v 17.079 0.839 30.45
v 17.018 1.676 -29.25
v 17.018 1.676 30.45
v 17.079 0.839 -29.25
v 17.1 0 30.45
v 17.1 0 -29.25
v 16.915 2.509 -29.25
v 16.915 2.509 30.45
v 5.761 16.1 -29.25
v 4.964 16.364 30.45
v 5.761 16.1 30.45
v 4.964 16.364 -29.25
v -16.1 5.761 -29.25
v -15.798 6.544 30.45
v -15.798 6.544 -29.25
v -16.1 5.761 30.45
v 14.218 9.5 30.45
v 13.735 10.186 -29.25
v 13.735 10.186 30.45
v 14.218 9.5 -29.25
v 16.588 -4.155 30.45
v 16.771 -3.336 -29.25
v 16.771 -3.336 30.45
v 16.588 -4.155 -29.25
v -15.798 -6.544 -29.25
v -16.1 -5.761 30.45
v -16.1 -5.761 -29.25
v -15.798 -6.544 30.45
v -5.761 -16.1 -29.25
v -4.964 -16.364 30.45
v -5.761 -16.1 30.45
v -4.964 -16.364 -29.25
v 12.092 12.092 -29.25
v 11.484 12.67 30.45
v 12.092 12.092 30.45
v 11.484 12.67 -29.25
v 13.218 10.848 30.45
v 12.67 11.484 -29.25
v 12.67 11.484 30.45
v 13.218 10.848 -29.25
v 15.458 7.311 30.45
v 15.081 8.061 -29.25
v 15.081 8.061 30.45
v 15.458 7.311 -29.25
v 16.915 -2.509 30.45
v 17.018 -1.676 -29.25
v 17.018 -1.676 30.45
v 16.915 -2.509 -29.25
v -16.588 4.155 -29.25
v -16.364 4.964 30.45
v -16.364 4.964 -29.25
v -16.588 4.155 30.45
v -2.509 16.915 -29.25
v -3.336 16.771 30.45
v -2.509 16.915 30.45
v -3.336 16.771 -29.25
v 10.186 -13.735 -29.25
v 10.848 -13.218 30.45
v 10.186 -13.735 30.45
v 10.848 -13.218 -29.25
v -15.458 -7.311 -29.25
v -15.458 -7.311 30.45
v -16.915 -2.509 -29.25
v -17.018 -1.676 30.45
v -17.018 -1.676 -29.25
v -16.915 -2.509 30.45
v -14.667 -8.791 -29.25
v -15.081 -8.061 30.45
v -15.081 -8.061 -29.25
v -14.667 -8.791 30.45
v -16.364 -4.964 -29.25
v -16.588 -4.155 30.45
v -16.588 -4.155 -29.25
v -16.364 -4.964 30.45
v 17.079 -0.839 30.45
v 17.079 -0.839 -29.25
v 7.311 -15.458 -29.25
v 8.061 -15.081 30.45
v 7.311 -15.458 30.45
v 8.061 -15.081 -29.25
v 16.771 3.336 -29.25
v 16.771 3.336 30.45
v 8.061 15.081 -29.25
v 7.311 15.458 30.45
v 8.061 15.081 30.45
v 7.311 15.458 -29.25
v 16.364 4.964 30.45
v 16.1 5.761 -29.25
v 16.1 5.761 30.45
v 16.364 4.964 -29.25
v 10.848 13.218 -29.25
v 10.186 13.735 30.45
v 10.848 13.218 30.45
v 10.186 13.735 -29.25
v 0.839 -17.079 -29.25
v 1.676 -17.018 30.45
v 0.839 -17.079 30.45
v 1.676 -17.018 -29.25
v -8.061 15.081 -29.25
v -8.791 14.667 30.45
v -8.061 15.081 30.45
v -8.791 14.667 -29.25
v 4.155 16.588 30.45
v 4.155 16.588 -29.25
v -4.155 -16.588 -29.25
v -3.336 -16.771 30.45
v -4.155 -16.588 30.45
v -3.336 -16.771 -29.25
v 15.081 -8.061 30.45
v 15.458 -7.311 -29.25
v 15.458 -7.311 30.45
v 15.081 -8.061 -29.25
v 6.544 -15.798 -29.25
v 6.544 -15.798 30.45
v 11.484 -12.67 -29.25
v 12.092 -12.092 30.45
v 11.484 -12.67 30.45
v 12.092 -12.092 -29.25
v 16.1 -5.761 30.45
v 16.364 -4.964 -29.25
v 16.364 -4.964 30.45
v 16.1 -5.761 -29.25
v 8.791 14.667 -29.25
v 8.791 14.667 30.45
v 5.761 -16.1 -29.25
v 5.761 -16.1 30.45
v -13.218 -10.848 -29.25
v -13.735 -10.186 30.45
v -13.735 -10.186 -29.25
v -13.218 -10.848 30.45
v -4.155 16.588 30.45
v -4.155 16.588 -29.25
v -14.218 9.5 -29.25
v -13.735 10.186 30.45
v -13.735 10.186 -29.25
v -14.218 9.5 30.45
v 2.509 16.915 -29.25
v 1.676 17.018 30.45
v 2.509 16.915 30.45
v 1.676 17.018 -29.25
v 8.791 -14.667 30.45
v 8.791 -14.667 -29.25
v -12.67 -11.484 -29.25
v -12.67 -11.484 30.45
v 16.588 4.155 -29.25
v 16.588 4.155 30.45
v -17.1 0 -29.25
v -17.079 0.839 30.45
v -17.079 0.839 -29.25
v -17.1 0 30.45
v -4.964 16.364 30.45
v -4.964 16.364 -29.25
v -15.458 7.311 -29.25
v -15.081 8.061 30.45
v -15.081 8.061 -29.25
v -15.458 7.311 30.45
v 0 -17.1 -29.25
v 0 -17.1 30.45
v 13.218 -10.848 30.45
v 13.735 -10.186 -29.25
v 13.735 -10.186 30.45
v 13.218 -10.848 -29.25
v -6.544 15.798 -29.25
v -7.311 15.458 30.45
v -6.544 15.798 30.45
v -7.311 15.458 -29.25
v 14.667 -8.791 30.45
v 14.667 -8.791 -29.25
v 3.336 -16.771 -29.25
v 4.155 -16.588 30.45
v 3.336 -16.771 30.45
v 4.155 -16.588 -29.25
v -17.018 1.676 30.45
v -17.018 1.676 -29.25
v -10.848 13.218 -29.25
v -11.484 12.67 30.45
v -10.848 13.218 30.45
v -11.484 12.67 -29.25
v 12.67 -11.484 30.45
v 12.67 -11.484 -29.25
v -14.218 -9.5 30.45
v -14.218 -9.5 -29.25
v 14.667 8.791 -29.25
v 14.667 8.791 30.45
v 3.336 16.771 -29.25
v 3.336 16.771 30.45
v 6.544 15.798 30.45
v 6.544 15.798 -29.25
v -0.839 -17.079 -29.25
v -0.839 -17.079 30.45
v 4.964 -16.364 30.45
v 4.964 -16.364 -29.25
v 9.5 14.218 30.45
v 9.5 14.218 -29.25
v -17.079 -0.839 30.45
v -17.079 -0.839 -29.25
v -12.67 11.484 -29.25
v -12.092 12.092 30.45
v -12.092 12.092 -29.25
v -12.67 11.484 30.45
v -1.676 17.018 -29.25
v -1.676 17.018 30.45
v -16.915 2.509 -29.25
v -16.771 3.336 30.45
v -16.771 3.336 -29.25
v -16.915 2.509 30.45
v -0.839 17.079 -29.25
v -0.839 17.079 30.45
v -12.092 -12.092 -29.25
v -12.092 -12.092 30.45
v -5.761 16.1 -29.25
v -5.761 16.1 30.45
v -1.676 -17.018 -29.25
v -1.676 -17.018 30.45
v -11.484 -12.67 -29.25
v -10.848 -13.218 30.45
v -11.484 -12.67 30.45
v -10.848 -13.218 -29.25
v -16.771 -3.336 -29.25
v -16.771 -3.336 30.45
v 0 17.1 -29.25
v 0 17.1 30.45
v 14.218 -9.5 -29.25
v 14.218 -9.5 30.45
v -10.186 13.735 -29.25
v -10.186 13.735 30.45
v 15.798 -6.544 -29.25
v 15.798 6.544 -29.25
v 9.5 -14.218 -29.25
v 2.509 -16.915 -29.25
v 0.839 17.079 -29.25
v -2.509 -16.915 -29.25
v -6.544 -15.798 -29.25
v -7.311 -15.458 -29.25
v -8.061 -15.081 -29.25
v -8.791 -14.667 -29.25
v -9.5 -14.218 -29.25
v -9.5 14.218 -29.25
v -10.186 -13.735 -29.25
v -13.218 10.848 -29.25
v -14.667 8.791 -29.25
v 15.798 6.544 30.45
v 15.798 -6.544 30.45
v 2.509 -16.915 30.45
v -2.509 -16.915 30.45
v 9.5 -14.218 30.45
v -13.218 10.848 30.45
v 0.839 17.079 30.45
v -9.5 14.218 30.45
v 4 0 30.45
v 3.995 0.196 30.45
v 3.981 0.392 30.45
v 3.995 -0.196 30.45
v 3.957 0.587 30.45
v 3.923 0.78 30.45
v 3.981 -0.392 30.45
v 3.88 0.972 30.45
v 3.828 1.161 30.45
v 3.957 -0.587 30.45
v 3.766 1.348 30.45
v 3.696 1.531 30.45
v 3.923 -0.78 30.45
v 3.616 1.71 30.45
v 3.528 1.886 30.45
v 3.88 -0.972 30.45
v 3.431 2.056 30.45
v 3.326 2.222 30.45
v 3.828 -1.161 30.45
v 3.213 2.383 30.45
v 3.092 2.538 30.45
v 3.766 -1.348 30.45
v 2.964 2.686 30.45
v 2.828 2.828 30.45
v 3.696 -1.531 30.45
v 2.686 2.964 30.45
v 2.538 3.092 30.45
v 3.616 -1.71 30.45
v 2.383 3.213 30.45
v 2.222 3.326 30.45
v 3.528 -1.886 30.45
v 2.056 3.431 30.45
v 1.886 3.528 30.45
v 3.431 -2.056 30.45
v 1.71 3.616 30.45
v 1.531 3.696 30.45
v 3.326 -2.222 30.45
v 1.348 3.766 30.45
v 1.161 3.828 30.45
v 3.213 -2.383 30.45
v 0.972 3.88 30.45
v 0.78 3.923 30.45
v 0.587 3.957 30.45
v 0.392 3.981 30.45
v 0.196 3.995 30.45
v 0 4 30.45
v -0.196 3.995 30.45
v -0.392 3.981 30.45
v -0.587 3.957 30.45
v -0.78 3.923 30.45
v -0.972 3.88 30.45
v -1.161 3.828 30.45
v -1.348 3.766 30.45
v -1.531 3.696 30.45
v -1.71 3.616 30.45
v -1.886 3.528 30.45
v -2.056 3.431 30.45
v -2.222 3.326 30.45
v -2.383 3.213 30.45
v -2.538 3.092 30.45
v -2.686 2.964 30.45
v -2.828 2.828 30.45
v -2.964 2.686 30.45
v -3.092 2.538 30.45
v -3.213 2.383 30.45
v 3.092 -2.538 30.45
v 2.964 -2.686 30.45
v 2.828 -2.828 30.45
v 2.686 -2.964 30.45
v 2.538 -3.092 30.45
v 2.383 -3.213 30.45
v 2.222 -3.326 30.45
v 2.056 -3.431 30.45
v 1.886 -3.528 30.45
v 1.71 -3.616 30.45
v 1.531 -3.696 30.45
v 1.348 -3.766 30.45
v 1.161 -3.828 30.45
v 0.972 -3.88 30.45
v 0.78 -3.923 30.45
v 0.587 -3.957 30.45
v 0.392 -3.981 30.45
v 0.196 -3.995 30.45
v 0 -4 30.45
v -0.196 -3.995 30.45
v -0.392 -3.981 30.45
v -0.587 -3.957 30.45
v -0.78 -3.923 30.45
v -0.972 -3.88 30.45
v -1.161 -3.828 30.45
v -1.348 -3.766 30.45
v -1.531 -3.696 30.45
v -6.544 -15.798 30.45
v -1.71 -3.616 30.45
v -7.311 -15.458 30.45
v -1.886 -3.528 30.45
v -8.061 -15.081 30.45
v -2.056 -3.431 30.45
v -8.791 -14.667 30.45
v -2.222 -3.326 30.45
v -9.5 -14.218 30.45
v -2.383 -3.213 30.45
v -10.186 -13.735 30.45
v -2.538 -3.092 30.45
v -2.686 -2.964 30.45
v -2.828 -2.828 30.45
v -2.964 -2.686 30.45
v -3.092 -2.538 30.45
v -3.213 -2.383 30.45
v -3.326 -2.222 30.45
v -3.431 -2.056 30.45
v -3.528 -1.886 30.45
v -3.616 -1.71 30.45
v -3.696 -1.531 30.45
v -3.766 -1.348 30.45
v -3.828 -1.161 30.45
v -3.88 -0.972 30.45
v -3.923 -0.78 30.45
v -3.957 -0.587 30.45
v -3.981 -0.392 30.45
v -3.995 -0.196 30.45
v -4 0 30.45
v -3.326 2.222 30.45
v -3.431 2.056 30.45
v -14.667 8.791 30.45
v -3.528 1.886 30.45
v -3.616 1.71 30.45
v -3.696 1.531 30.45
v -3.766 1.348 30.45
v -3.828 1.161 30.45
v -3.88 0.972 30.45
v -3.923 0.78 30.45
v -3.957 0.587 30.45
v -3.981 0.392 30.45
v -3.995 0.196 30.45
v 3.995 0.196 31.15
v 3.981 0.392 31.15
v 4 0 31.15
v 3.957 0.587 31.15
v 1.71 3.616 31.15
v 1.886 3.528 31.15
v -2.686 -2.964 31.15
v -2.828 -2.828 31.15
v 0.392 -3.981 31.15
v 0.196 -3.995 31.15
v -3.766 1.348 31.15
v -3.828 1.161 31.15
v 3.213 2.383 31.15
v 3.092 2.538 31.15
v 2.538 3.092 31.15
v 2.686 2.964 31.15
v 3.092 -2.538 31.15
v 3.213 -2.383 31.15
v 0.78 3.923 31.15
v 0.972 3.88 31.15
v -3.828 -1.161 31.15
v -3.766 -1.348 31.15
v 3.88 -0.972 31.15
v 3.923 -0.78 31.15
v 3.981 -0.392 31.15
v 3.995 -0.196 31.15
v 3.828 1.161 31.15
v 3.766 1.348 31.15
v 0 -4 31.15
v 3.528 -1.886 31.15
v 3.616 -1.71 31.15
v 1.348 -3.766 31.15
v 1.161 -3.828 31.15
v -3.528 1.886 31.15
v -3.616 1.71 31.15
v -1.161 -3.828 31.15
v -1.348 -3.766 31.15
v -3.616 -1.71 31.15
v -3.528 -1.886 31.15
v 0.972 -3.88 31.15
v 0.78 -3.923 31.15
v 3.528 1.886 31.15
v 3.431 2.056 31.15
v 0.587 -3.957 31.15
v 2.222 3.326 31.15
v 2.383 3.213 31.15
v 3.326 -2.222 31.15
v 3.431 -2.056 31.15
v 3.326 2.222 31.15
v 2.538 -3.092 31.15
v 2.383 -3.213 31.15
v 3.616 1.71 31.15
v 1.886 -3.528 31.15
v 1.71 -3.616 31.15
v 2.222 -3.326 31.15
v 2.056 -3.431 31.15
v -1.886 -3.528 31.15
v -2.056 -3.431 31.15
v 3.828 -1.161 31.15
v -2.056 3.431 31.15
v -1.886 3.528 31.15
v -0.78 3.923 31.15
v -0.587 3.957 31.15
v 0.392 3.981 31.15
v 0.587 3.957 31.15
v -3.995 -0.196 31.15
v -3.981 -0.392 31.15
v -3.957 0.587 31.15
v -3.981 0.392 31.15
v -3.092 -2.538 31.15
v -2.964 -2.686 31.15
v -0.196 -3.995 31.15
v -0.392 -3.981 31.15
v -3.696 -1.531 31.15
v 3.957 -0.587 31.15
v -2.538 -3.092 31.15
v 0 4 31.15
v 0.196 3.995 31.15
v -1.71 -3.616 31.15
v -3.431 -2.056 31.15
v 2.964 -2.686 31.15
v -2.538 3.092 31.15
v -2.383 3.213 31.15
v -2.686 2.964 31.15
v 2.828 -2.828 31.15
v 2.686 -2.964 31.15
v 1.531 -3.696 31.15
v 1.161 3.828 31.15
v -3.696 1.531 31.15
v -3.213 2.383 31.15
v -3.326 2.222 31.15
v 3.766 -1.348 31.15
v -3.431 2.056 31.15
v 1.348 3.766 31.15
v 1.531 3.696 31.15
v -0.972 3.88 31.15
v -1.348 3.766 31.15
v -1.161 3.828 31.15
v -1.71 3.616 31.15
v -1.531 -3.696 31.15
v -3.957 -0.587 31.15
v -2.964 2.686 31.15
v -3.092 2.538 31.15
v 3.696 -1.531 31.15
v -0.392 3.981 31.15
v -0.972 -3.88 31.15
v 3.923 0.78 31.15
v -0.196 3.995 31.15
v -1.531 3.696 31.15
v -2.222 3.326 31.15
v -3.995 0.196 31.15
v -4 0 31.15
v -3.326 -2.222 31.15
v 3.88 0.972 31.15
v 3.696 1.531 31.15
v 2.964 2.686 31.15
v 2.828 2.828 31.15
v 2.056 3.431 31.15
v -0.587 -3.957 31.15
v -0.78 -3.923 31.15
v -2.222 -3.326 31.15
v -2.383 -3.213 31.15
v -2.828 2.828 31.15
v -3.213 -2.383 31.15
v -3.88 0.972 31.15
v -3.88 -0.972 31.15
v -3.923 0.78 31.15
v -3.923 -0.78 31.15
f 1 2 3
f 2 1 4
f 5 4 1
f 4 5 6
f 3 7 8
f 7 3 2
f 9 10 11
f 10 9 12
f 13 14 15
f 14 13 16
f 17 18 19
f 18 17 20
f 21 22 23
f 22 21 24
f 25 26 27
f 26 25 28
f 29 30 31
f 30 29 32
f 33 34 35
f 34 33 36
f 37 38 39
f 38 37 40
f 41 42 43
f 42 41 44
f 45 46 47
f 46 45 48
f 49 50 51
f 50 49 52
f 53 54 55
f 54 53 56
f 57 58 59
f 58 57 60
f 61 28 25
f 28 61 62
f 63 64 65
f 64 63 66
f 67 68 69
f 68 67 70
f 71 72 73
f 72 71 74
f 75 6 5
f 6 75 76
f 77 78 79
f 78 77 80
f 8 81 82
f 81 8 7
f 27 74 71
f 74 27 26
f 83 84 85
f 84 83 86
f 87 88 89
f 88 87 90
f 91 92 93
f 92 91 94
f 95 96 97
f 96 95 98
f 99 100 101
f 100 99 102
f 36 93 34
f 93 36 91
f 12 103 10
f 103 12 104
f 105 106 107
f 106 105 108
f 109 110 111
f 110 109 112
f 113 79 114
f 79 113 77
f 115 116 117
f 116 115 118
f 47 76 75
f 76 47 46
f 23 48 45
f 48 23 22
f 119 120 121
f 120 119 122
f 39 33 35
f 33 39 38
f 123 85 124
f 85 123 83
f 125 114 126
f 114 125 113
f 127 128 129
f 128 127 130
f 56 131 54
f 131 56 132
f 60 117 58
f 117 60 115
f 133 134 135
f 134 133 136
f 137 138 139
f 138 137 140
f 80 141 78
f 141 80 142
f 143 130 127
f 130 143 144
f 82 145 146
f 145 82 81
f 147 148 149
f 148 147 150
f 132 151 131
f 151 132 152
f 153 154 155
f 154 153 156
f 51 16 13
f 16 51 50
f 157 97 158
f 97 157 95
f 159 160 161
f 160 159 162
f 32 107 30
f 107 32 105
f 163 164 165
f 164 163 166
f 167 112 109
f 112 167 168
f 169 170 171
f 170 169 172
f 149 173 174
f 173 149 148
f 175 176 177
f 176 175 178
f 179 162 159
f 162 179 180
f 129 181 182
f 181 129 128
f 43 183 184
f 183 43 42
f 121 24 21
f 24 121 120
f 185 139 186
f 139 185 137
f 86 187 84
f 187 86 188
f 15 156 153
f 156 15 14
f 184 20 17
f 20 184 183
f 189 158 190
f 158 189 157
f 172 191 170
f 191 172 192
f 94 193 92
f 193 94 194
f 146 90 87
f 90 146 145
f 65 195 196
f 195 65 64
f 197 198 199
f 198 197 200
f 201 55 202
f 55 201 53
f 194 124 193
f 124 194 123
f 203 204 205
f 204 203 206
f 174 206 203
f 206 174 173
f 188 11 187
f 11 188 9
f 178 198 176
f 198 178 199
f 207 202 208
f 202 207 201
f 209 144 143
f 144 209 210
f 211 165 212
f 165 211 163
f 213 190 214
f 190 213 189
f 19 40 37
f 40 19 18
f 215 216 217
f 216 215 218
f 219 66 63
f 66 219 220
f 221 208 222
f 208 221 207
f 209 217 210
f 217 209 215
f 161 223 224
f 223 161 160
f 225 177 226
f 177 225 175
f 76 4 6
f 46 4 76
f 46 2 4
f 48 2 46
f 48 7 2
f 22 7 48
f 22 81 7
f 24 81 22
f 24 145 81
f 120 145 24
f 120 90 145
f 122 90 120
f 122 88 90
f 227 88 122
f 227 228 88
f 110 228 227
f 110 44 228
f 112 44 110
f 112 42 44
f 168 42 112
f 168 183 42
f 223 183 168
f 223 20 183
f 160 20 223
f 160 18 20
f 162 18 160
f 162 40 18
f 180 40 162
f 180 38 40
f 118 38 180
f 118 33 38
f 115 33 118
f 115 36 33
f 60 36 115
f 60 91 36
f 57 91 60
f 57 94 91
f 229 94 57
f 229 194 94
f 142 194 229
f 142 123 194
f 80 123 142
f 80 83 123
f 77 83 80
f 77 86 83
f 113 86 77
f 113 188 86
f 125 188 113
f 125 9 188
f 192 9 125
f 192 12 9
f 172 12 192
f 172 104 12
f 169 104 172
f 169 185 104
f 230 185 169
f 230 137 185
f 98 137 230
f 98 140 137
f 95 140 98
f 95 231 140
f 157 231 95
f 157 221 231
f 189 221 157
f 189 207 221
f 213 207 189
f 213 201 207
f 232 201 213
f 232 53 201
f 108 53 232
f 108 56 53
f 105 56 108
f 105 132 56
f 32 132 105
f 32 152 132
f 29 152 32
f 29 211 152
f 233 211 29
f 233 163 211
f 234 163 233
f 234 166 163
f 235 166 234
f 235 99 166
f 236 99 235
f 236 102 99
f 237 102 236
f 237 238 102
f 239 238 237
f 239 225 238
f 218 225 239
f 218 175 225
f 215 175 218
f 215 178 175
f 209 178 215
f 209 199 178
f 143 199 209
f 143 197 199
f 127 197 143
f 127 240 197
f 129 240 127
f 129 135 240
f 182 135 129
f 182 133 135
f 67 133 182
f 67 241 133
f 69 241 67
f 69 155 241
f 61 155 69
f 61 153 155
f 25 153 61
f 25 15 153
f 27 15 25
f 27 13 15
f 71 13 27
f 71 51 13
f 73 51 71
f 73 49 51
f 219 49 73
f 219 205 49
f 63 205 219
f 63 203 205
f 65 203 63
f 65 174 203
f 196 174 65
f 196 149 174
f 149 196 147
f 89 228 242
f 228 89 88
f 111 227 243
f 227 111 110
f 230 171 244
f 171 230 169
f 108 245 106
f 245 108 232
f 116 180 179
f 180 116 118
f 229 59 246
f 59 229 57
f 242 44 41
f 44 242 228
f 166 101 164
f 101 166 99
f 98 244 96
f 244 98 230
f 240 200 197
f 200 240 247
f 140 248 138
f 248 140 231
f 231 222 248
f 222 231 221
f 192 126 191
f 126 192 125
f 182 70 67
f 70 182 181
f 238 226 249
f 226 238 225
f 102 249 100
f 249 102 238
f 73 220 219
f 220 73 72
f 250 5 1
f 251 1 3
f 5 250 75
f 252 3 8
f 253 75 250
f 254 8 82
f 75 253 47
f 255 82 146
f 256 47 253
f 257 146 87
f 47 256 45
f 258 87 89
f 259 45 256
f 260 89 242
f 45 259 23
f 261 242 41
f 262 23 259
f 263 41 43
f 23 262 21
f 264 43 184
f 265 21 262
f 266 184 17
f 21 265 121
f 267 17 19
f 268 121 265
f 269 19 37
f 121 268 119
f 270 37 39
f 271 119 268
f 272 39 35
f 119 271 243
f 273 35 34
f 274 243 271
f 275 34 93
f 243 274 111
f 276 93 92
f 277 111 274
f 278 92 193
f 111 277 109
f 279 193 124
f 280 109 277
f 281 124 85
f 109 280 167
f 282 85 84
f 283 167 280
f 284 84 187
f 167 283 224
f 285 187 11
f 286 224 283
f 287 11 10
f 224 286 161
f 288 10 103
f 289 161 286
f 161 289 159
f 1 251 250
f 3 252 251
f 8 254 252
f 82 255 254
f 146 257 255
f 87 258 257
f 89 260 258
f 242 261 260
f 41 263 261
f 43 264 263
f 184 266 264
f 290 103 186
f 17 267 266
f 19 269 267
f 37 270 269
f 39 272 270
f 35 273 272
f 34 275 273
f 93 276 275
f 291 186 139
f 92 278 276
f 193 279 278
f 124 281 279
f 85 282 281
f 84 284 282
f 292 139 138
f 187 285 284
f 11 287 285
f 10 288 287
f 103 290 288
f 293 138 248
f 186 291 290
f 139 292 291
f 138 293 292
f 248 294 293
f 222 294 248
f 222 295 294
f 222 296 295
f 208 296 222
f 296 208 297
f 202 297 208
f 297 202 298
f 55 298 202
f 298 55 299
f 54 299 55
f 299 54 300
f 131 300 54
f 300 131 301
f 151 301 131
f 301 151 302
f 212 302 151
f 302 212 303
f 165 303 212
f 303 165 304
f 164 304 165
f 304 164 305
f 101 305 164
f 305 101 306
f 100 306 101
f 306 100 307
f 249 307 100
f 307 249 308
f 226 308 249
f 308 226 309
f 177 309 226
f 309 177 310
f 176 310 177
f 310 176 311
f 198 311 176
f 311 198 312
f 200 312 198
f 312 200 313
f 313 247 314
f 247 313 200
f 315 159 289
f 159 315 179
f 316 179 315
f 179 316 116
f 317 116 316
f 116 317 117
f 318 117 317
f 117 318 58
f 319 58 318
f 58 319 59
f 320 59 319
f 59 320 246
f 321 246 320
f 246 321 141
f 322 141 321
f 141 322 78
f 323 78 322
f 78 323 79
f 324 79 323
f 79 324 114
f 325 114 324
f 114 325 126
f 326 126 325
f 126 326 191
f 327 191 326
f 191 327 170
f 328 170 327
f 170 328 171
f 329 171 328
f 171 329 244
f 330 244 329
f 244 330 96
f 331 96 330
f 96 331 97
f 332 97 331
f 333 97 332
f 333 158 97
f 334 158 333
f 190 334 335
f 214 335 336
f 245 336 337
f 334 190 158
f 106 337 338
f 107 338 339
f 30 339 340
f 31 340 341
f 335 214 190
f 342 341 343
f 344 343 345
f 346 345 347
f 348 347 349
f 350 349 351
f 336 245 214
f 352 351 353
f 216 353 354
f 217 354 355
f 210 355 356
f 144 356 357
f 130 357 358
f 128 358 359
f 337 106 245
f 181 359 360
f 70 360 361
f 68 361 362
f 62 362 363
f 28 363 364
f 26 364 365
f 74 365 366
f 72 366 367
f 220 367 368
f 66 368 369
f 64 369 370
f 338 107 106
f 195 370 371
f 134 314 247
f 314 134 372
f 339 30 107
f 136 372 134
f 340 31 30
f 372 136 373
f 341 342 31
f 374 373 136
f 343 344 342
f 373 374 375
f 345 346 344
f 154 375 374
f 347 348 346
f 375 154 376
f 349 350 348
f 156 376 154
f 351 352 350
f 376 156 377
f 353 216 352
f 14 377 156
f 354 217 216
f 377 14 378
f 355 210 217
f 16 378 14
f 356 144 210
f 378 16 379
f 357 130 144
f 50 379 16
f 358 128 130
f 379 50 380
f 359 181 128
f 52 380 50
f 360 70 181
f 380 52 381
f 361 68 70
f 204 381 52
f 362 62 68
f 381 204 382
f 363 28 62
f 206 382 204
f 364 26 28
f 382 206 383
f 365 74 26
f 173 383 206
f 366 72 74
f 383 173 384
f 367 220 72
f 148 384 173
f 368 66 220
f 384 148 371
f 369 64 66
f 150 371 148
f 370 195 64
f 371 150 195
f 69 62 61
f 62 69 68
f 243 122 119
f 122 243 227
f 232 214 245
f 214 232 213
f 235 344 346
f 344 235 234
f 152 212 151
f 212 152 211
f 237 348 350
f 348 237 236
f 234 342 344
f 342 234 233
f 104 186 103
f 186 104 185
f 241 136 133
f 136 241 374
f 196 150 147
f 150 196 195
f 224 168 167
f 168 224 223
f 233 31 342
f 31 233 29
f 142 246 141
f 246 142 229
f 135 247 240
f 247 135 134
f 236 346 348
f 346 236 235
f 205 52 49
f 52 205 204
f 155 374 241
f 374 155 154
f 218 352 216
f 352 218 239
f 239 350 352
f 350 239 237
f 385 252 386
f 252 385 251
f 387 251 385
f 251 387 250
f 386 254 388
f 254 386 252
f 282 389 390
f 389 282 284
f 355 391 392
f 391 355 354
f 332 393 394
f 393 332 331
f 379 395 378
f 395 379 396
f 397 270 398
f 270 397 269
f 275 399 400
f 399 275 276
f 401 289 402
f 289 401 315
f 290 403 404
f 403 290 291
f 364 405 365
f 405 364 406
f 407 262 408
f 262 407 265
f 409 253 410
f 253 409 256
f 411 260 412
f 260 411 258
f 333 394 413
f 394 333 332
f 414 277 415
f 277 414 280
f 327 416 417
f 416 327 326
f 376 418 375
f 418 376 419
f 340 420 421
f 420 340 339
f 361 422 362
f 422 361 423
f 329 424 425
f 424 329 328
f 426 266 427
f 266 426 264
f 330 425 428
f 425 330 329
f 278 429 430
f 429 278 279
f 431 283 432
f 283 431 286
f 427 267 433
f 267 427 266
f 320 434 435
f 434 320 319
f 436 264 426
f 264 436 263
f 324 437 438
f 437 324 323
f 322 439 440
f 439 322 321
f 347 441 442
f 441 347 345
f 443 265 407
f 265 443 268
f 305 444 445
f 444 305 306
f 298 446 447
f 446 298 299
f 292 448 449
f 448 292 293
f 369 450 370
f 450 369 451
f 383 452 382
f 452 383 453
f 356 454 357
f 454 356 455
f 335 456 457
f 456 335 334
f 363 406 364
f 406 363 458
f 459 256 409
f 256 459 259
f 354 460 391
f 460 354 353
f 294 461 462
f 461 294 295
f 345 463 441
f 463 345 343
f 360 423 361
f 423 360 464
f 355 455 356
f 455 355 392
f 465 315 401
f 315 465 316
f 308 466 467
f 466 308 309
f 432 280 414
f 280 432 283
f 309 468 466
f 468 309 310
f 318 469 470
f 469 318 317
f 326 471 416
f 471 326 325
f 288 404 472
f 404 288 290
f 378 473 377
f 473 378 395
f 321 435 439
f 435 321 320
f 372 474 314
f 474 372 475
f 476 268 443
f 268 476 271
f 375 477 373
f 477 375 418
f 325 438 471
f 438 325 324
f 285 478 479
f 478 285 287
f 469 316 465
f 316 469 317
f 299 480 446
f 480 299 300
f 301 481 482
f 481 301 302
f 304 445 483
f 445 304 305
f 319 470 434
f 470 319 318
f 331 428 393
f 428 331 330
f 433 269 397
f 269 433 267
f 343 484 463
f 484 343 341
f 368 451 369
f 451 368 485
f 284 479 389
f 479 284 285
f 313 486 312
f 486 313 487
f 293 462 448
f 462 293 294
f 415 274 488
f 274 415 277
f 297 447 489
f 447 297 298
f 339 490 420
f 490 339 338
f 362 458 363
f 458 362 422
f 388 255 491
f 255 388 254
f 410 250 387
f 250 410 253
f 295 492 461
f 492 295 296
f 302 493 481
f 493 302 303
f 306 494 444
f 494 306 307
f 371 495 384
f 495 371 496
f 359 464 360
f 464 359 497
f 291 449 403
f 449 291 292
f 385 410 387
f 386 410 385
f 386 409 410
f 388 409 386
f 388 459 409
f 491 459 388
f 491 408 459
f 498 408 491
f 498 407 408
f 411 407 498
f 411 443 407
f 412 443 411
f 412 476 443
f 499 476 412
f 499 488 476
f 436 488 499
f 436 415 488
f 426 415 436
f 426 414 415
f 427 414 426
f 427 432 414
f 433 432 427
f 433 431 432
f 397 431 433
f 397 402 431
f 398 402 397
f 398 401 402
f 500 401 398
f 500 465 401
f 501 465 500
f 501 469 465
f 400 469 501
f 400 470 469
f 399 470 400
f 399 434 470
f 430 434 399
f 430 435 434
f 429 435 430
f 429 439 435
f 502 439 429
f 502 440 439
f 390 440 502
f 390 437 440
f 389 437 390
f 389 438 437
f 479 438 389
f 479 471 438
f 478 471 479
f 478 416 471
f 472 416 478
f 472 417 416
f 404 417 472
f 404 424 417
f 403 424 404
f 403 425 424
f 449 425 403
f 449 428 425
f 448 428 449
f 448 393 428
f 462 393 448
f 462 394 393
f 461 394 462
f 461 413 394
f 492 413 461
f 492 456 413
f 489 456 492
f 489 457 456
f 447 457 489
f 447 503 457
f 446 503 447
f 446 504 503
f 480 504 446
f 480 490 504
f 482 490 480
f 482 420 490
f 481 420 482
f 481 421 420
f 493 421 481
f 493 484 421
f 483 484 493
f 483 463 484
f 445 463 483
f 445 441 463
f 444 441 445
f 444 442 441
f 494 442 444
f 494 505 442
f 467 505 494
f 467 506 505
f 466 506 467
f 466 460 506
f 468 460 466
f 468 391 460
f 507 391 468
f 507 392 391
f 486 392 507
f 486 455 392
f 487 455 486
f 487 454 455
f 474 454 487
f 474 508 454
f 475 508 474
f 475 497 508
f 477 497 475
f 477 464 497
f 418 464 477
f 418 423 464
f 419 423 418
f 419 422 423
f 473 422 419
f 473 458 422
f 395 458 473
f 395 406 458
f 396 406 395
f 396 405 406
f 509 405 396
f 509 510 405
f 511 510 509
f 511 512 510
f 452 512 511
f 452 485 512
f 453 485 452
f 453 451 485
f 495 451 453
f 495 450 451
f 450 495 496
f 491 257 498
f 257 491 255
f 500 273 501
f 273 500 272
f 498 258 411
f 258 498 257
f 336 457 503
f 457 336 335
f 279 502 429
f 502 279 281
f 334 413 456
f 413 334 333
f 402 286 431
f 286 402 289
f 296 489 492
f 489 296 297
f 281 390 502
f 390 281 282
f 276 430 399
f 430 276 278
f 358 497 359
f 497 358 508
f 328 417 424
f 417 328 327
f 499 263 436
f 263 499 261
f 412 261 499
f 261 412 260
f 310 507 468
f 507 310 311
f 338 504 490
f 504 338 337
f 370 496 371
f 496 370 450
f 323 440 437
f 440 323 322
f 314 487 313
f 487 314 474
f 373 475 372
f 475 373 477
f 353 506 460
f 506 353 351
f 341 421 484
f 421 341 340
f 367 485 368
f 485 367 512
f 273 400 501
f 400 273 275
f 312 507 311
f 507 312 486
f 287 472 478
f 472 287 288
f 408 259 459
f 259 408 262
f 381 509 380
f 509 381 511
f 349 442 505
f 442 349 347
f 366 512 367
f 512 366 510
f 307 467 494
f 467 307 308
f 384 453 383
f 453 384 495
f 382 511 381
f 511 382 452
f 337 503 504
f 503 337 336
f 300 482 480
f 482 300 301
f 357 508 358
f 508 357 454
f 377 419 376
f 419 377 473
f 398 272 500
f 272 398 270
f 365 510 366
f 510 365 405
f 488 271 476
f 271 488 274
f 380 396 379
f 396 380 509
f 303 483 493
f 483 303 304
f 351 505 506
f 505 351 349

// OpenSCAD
// Battery cell parameters (mm)
height_mm = 61.5;                     // total height including terminals
diameter_mm = 34.2;                   // main can diameter

positive_terminal_diameter_mm = 8;
positive_terminal_height_mm   = 1.5;

negative_terminal_diameter_mm = 10;
negative_terminal_height_mm   = 0.3;

connect_overlap_mm = 0.8;             // ensures one connected solid

$fn = 128;

module battery() {
    r_body = diameter_mm/2;

    // Split total height into body + terminals so overall height matches height_mm
    body_h = height_mm - positive_terminal_height_mm - negative_terminal_height_mm;

    // Z positions computed from dimensions (no arbitrary numbers)
    z_body = (positive_terminal_height_mm - negative_terminal_height_mm)/2;
    z_pos  = z_body + body_h/2 + positive_terminal_height_mm/2 - connect_overlap_mm;
    z_neg  = z_body - body_h/2 - negative_terminal_height_mm/2 + connect_overlap_mm;

    color("Silver")
    union() {
        // Main cylindrical can
        translate([0, 0, z_body])
            cylinder(h=body_h, r=r_body, center=true);

        // Positive terminal button (top)
        translate([0, 0, z_pos])
            cylinder(h=positive_terminal_height_mm,
                     r=positive_terminal_diameter_mm/2,
                     center=true);

        // Negative terminal contact (bottom)
        translate([0, 0, z_neg])
            cylinder(h=negative_terminal_height_mm,
                     r=negative_terminal_diameter_mm/2,
                     center=true);
    }
}

battery();
